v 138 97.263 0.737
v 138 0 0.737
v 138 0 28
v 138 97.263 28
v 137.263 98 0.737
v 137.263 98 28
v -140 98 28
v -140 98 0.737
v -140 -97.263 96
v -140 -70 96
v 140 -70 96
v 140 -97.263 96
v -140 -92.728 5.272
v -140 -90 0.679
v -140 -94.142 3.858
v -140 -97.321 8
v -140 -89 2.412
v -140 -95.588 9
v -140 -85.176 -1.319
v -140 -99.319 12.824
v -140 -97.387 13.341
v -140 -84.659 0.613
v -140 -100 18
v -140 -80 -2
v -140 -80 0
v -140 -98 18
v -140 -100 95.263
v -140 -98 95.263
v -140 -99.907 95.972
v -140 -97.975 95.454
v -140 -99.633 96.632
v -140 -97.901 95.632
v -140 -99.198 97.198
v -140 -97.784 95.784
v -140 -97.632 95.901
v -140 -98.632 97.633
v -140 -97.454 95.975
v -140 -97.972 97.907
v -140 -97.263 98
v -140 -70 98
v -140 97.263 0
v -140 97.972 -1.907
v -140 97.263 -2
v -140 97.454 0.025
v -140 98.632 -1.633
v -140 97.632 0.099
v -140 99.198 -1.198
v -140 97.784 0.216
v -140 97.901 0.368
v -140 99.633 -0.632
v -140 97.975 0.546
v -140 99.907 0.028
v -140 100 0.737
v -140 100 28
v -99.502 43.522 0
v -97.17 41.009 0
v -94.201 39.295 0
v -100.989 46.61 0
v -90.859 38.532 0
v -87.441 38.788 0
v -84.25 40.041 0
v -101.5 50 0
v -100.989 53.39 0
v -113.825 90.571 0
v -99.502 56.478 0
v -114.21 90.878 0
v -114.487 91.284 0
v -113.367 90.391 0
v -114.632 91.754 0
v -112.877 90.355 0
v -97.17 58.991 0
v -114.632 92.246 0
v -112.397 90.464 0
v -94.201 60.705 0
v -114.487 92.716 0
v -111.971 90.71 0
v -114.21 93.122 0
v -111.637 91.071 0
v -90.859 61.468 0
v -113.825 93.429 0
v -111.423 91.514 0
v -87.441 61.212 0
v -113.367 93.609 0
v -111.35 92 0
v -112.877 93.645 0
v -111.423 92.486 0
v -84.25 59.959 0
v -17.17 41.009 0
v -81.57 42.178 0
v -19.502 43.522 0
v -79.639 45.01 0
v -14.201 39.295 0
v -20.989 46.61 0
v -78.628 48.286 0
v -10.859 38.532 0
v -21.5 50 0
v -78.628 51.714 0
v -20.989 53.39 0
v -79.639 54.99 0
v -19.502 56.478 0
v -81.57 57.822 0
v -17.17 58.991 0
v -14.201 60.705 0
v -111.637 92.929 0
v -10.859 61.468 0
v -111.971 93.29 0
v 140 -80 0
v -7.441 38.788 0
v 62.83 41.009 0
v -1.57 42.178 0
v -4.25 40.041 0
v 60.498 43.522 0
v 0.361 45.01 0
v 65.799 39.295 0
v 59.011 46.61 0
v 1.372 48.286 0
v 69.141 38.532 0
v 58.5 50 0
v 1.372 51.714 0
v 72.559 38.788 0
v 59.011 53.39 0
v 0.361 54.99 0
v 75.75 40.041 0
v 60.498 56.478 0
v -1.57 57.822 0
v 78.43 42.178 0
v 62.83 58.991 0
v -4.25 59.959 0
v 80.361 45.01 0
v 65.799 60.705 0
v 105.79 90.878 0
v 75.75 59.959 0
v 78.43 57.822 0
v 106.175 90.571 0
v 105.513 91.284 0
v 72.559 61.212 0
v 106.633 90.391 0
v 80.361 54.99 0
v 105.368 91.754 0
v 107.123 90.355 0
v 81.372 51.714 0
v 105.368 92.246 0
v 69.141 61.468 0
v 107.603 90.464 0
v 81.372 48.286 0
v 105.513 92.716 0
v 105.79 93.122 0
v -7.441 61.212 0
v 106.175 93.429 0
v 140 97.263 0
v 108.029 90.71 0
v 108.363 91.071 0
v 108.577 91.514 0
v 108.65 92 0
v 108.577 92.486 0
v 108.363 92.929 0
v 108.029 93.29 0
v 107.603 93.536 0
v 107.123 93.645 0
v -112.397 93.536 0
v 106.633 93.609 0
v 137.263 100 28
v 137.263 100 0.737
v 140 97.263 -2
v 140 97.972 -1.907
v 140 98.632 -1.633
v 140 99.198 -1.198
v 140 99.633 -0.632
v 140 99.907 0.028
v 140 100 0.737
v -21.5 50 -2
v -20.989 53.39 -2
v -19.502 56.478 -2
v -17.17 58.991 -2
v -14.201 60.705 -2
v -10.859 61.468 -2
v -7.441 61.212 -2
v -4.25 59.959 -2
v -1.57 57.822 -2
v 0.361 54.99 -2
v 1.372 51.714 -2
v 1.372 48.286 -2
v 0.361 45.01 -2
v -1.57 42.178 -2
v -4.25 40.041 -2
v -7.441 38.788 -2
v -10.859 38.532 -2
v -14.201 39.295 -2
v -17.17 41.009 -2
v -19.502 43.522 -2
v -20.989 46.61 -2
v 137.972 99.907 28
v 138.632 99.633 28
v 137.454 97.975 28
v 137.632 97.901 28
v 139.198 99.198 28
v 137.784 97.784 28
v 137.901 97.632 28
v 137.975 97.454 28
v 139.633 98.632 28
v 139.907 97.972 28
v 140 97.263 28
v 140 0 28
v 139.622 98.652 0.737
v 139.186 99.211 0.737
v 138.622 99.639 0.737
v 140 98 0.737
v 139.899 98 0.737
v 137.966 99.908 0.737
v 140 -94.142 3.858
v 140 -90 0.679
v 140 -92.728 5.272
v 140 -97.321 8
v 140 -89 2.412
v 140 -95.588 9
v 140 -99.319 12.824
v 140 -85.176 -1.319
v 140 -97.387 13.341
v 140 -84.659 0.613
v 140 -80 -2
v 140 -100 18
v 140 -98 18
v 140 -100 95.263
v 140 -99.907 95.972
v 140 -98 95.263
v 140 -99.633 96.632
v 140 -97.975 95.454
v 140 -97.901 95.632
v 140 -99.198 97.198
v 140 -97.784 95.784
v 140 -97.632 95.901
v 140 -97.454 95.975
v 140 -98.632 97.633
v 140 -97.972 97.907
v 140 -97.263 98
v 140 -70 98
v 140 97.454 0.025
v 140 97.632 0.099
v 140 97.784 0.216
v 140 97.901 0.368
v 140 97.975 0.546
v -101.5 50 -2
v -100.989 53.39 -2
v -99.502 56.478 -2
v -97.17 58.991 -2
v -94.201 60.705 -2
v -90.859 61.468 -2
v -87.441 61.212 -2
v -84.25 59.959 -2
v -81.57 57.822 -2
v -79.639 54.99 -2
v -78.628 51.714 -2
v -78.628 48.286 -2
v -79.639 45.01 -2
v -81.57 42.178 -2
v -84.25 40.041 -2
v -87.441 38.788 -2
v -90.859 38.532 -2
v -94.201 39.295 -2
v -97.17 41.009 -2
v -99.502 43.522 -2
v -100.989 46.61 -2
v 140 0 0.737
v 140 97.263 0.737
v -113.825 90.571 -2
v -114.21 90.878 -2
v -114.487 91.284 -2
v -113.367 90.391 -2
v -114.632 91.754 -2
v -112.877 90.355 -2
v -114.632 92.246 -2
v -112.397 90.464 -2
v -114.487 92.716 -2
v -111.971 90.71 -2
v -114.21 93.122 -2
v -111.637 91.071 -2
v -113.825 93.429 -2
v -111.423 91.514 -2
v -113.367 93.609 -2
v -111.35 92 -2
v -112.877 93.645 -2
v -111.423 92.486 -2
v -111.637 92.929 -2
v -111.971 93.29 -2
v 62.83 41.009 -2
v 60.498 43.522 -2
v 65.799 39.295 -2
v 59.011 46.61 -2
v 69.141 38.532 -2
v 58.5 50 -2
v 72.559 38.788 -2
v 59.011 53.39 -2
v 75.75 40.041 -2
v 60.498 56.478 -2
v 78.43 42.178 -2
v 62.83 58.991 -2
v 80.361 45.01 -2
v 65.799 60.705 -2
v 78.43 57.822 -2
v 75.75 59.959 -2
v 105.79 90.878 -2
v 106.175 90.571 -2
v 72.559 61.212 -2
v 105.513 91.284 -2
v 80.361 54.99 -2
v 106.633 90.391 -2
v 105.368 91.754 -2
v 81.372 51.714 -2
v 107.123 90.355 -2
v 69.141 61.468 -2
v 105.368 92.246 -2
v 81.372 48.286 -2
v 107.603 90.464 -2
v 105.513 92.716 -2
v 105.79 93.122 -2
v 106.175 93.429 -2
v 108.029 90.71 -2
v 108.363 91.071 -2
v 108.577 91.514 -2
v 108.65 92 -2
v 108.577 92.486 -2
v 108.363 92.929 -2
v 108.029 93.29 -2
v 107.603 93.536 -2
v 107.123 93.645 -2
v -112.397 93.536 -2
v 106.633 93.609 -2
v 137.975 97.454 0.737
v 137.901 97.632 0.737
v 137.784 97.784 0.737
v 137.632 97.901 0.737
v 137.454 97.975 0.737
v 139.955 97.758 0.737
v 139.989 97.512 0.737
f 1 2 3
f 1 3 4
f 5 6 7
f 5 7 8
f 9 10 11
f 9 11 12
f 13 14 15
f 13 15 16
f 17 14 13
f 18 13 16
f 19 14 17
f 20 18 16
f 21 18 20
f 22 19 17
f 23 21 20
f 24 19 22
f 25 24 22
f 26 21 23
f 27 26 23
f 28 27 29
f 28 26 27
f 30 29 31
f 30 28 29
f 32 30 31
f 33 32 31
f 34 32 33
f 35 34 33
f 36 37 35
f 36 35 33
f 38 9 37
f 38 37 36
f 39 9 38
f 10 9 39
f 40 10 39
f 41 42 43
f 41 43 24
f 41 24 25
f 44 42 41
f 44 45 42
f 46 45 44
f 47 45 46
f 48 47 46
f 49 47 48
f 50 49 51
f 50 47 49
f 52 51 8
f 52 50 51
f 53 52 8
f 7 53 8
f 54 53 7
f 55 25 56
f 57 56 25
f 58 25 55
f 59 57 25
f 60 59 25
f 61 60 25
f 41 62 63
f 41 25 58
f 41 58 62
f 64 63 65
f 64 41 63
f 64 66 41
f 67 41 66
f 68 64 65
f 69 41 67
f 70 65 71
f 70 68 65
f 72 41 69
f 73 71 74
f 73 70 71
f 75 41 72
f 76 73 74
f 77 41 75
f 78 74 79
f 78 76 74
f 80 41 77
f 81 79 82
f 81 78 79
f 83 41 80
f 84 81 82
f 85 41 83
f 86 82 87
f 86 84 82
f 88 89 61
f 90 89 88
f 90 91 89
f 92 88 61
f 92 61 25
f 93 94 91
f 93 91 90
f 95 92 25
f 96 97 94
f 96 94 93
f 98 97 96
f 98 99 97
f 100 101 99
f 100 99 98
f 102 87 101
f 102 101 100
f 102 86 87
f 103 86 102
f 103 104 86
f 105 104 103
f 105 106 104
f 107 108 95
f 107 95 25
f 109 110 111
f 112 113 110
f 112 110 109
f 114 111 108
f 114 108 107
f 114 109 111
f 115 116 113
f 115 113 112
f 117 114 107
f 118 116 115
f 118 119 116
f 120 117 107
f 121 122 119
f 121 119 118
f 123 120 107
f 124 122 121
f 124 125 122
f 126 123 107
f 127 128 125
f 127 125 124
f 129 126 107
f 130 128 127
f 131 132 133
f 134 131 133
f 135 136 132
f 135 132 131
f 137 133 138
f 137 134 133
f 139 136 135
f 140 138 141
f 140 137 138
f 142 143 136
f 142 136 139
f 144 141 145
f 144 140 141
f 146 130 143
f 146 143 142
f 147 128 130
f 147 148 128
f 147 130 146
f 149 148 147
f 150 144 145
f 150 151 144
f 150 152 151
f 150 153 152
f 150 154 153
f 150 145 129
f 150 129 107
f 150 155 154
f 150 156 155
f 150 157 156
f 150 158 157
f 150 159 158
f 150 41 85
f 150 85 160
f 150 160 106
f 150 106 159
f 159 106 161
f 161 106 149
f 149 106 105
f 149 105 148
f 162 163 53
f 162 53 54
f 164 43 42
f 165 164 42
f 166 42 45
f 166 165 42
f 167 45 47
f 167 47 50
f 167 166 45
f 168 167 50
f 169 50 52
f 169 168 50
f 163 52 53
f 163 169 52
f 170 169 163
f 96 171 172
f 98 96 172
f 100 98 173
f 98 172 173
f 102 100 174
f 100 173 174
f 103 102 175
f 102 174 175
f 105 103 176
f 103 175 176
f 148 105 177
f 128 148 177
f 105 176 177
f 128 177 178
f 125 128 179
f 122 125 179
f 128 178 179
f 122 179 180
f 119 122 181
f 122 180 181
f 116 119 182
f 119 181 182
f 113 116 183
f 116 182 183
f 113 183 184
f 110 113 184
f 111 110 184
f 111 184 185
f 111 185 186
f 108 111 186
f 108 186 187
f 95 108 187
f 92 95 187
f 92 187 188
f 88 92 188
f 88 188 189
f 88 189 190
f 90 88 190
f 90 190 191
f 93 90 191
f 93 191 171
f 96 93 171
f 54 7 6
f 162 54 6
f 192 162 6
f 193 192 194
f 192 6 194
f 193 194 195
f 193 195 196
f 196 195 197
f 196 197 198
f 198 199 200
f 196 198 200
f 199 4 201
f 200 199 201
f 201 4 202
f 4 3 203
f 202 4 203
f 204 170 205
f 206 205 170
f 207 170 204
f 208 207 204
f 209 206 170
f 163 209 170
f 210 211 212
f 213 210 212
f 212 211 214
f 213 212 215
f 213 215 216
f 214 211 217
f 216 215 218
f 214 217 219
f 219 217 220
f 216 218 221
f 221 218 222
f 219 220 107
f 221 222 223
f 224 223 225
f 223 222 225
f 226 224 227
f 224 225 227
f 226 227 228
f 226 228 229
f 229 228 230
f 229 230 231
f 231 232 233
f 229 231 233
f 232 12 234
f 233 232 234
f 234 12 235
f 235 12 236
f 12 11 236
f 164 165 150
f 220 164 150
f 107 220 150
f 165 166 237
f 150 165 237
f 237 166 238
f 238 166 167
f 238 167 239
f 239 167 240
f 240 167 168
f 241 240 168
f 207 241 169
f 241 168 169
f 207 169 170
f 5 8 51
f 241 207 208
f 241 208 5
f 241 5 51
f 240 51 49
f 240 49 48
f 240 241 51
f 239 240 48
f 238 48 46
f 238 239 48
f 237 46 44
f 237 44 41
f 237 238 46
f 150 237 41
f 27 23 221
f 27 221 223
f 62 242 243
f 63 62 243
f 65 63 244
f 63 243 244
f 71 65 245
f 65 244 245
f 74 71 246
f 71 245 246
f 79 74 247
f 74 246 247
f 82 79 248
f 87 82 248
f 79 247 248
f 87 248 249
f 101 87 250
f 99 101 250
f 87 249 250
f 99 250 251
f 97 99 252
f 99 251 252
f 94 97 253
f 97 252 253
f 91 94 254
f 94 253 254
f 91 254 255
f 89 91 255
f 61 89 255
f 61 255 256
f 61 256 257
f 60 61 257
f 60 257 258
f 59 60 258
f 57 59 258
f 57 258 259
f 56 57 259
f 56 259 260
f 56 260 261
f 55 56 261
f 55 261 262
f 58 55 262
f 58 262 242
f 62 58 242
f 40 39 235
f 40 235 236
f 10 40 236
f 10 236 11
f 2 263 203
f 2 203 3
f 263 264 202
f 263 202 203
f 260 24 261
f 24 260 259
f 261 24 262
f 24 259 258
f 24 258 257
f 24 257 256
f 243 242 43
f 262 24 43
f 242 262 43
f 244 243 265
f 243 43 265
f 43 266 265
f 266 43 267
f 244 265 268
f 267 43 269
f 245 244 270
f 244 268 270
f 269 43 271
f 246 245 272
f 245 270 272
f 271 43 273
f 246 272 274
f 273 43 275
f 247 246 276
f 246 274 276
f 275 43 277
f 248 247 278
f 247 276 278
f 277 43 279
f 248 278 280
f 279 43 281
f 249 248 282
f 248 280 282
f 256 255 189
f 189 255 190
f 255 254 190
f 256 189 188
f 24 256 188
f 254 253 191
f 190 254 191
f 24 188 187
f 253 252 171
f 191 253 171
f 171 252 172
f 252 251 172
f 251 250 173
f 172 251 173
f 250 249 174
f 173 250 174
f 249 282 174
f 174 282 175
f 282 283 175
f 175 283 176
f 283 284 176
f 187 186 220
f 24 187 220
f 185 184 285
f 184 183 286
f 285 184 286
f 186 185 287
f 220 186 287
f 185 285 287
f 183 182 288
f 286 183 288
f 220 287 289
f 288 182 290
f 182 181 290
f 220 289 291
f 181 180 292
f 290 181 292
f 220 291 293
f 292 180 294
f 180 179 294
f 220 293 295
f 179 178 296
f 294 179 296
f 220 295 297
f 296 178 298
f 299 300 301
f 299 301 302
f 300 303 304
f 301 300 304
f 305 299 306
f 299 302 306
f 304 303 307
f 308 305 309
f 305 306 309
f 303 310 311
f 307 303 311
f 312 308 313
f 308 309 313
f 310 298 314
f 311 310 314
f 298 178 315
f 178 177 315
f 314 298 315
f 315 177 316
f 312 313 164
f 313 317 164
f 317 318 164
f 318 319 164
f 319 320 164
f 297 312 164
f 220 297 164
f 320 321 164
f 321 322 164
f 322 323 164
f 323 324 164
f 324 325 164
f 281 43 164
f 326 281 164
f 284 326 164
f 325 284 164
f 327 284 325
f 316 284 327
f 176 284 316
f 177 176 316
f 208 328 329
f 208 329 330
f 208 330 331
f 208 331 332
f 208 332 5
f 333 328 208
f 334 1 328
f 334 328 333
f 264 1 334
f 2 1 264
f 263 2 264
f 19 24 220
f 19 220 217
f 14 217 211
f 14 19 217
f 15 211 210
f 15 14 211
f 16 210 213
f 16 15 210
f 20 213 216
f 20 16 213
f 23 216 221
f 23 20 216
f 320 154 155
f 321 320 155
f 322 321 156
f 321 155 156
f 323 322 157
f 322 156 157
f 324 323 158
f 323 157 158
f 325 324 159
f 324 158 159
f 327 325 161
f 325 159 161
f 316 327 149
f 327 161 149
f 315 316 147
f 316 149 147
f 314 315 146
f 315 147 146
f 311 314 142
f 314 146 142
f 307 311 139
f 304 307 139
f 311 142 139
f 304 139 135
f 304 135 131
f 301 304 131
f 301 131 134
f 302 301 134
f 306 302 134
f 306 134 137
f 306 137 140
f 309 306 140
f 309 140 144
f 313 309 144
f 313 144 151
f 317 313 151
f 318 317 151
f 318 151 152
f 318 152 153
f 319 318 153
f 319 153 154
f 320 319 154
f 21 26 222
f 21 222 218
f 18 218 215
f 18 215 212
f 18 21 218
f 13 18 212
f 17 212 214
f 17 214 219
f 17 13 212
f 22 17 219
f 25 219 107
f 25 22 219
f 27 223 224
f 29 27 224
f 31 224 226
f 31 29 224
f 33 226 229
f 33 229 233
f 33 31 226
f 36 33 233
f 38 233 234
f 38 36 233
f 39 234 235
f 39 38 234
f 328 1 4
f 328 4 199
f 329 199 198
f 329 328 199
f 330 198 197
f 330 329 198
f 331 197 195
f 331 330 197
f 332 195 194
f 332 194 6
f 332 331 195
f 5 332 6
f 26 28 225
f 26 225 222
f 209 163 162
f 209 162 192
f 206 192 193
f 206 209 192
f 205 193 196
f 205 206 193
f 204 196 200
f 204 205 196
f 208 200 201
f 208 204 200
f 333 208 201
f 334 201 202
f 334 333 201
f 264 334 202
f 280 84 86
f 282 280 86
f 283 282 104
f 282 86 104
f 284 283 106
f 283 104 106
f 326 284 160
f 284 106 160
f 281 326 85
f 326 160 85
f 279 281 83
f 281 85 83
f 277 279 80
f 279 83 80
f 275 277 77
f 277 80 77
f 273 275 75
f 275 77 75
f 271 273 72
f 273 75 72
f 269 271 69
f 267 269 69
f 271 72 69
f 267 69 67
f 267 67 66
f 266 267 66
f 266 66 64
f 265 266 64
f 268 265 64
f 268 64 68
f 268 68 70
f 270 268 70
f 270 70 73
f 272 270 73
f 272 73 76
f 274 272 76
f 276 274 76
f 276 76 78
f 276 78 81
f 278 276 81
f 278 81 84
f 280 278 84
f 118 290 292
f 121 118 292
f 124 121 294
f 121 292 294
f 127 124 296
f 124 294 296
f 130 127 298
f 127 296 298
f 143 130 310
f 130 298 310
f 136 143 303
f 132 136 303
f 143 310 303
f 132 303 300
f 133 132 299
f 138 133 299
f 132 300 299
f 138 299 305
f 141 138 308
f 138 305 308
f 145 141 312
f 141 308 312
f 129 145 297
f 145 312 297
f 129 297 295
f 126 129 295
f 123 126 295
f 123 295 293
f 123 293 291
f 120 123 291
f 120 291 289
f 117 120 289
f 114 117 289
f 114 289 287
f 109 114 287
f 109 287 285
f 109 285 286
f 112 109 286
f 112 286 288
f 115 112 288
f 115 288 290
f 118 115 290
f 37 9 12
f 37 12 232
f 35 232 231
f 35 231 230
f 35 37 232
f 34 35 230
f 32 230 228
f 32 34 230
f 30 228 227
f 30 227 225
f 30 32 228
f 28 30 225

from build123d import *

# Parameters (mm, degrees)
SKETCH_2_W                       = 280
SKETCH_2_H                       = 200
SM_BASE_FLANGE_1_DEPTH           = 2
SM_EDGE_FLANGE_1_STRIP_W         = 44
SM_EDGE_FLANGE_1_STRIP_H         = 2
SM_EDGE_FLANGE_1_STRIP_CUT_DEPTH = 280
SM_EDGE_FLANGE_1_DEPTH           = 280
SM_EDGE_FLANGE_2_STRIP_W         = 9.4732
SM_EDGE_FLANGE_2_STRIP_H         = 2
SM_EDGE_FLANGE_2_STRIP_CUT_DEPTH = 280
SM_EDGE_FLANGE_2_DEPTH           = 280
SM_EDGE_FLANGE_3_STRIP_W         = 9.4732
SM_EDGE_FLANGE_3_STRIP_H         = 2
SM_EDGE_FLANGE_3_STRIP_CUT_DEPTH = 280
SM_EDGE_FLANGE_3_DEPTH           = 280
SKETCH_36_R                      = 11.5
CUT_EXTRUDE_3_DEPTH              = 10
SM_EDGE_FLANGE_4_STRIP_W         = 9.4732
SM_EDGE_FLANGE_4_STRIP_H         = 2
SM_EDGE_FLANGE_4_STRIP_CUT_DEPTH = 27.2634
SM_EDGE_FLANGE_4_DEPTH           = 27.2634
HOLE_WIZARD_M4_1_D               = 3.3


# Sheet-metal steps are written as plain solids
with BuildPart() as part:
    # Sketch 2 → 基体-法兰1 (new body)
    with BuildSketch(Plane.XY):
        Rectangle(SKETCH_2_W, SKETCH_2_H)
    extrude(amount=-SM_BASE_FLANGE_1_DEPTH)

    # 边线-法兰1 strip (across the edge) → 边线-法兰1 strip cut (cut)
    with BuildSketch(Plane(origin=(-140, -100, 0), x_dir=(0, 1, 0), z_dir=(1, 0, 0))):
        with Locations((-2, -1)):
            Rectangle(SM_EDGE_FLANGE_1_STRIP_W, SM_EDGE_FLANGE_1_STRIP_H)
    extrude(amount=SM_EDGE_FLANGE_1_STRIP_CUT_DEPTH, mode=Mode.SUBTRACT)

    # 边线-法兰1 section (across the edge) → 边线-法兰1 (add)
    with BuildSketch(Plane(origin=(-140, -100, 0), x_dir=(0, 1, 0), z_dir=(1, 0, 0))):
        with BuildLine():
            Line((0, 18), (0, 98))
            Line((0, 98), (2, 98))
            Line((2, 98), (2, 18))
            ThreePointArc((2, 18), (7.272077939, 5.272077939), (20, 0))
            Line((20, 0), (20, -2))
            ThreePointArc((20, -2), (5.857864376, 3.857864376), (0, 18))
        make_face()
    extrude(amount=SM_EDGE_FLANGE_1_DEPTH)

    # 边线-法兰2 strip (across the edge) → 边线-法兰2 strip cut (cut)
    with BuildSketch(Plane(origin=(140, 100, 0), x_dir=(0, -1, 0), z_dir=(-1, 0, 0))):
        with Locations((-2, -1)):
            Rectangle(SM_EDGE_FLANGE_2_STRIP_W, SM_EDGE_FLANGE_2_STRIP_H)
    extrude(amount=SM_EDGE_FLANGE_2_STRIP_CUT_DEPTH, mode=Mode.SUBTRACT)

    # 边线-法兰2 section (across the edge) → 边线-法兰2 (add)
    with BuildSketch(Plane(origin=(140, 100, 0), x_dir=(0, -1, 0), z_dir=(-1, 0, 0))):
        with BuildLine():
            Line((0, 0.7366), (0, 28))
            Line((0, 28), (2, 28))
            Line((2, 28), (2, 0.7366))
            ThreePointArc((2, 0.7366), (2.215745145, 0.215745145), (2.7366, 0))
            Line((2.7366, 0), (2.7366, -2))
            ThreePointArc((2.7366, -2), (0.801531583, -1.198468417), (0, 0.7366))
        make_face()
    extrude(amount=SM_EDGE_FLANGE_2_DEPTH)

    # 边线-法兰3 strip (across the edge) → 边线-法兰3 strip cut (cut)
    with BuildSketch(Plane(origin=(-140, -98, 98), x_dir=(0, 0, -1), z_dir=(1, 0, 0))):
        with Locations((-2, -1)):
            Rectangle(SM_EDGE_FLANGE_3_STRIP_W, SM_EDGE_FLANGE_3_STRIP_H)
    extrude(amount=SM_EDGE_FLANGE_3_STRIP_CUT_DEPTH, mode=Mode.SUBTRACT)

    # 边线-法兰3 section (across the edge) → 边线-法兰3 (add)
    with BuildSketch(Plane(origin=(-140, -98, 98), x_dir=(0, 0, -1), z_dir=(1, 0, 0))):
        with BuildLine():
            Line((0, 0.7366), (0, 28))
            Line((0, 28), (2, 28))
            Line((2, 28), (2, 0.7366))
            ThreePointArc((2, 0.7366), (2.215745145, 0.215745145), (2.7366, 0))
            Line((2.7366, 0), (2.7366, -2))
            ThreePointArc((2.7366, -2), (0.801531583, -1.198468417), (0, 0.7366))
        make_face()
    extrude(amount=SM_EDGE_FLANGE_3_DEPTH)

    # 草图36 → 切除-拉伸3 (cut)
    with BuildSketch(Plane(origin=(0, 0, -2), x_dir=(-1, 0, 0), z_dir=(0, 0, -1))):
        with Locations((-70, 50)):
            Circle(SKETCH_36_R)
        with Locations((10, 50)):
            Circle(SKETCH_36_R)
        with Locations((90, 50)):
            Circle(SKETCH_36_R)
    extrude(amount=-CUT_EXTRUDE_3_DEPTH, mode=Mode.SUBTRACT)

    # 边线-法兰4 strip (across the edge) → 边线-法兰4 strip cut (cut)
    with BuildSketch(Plane(origin=(140, 98, 0.7366), x_dir=(-1, 0, 0), z_dir=(0, 0, 1))):
        with Locations((-2, -1)):
            Rectangle(SM_EDGE_FLANGE_4_STRIP_W, SM_EDGE_FLANGE_4_STRIP_H)
    extrude(amount=SM_EDGE_FLANGE_4_STRIP_CUT_DEPTH, mode=Mode.SUBTRACT)

    # 边线-法兰4 section (across the edge) → 边线-法兰4 (add)
    with BuildSketch(Plane(origin=(140, 98, 0.7366), x_dir=(-1, 0, 0), z_dir=(0, 0, 1))):
        with BuildLine():
            Line((0, 0.7366), (0, 98))
            Line((0, 98), (2, 98))
            Line((2, 98), (2, 0.7366))
            ThreePointArc((2, 0.7366), (2.215745145, 0.215745145), (2.7366, 0))
            Line((2.7366, 0), (2.7366, -2))
            ThreePointArc((2.7366, -2), (0.801531583, -1.198468417), (0, 0.7366))
        make_face()
    extrude(amount=SM_EDGE_FLANGE_4_DEPTH)

    # M4 螺纹孔1 (through all)
    with Locations(Plane(origin=(0, 0, -2), x_dir=(-1, 0, 0), z_dir=(0, 0, -1))):
        with Locations((-107, 92), (113, 92)):
            Hole(HOLE_WIZARD_M4_1_D / 2)


solid = part.part
